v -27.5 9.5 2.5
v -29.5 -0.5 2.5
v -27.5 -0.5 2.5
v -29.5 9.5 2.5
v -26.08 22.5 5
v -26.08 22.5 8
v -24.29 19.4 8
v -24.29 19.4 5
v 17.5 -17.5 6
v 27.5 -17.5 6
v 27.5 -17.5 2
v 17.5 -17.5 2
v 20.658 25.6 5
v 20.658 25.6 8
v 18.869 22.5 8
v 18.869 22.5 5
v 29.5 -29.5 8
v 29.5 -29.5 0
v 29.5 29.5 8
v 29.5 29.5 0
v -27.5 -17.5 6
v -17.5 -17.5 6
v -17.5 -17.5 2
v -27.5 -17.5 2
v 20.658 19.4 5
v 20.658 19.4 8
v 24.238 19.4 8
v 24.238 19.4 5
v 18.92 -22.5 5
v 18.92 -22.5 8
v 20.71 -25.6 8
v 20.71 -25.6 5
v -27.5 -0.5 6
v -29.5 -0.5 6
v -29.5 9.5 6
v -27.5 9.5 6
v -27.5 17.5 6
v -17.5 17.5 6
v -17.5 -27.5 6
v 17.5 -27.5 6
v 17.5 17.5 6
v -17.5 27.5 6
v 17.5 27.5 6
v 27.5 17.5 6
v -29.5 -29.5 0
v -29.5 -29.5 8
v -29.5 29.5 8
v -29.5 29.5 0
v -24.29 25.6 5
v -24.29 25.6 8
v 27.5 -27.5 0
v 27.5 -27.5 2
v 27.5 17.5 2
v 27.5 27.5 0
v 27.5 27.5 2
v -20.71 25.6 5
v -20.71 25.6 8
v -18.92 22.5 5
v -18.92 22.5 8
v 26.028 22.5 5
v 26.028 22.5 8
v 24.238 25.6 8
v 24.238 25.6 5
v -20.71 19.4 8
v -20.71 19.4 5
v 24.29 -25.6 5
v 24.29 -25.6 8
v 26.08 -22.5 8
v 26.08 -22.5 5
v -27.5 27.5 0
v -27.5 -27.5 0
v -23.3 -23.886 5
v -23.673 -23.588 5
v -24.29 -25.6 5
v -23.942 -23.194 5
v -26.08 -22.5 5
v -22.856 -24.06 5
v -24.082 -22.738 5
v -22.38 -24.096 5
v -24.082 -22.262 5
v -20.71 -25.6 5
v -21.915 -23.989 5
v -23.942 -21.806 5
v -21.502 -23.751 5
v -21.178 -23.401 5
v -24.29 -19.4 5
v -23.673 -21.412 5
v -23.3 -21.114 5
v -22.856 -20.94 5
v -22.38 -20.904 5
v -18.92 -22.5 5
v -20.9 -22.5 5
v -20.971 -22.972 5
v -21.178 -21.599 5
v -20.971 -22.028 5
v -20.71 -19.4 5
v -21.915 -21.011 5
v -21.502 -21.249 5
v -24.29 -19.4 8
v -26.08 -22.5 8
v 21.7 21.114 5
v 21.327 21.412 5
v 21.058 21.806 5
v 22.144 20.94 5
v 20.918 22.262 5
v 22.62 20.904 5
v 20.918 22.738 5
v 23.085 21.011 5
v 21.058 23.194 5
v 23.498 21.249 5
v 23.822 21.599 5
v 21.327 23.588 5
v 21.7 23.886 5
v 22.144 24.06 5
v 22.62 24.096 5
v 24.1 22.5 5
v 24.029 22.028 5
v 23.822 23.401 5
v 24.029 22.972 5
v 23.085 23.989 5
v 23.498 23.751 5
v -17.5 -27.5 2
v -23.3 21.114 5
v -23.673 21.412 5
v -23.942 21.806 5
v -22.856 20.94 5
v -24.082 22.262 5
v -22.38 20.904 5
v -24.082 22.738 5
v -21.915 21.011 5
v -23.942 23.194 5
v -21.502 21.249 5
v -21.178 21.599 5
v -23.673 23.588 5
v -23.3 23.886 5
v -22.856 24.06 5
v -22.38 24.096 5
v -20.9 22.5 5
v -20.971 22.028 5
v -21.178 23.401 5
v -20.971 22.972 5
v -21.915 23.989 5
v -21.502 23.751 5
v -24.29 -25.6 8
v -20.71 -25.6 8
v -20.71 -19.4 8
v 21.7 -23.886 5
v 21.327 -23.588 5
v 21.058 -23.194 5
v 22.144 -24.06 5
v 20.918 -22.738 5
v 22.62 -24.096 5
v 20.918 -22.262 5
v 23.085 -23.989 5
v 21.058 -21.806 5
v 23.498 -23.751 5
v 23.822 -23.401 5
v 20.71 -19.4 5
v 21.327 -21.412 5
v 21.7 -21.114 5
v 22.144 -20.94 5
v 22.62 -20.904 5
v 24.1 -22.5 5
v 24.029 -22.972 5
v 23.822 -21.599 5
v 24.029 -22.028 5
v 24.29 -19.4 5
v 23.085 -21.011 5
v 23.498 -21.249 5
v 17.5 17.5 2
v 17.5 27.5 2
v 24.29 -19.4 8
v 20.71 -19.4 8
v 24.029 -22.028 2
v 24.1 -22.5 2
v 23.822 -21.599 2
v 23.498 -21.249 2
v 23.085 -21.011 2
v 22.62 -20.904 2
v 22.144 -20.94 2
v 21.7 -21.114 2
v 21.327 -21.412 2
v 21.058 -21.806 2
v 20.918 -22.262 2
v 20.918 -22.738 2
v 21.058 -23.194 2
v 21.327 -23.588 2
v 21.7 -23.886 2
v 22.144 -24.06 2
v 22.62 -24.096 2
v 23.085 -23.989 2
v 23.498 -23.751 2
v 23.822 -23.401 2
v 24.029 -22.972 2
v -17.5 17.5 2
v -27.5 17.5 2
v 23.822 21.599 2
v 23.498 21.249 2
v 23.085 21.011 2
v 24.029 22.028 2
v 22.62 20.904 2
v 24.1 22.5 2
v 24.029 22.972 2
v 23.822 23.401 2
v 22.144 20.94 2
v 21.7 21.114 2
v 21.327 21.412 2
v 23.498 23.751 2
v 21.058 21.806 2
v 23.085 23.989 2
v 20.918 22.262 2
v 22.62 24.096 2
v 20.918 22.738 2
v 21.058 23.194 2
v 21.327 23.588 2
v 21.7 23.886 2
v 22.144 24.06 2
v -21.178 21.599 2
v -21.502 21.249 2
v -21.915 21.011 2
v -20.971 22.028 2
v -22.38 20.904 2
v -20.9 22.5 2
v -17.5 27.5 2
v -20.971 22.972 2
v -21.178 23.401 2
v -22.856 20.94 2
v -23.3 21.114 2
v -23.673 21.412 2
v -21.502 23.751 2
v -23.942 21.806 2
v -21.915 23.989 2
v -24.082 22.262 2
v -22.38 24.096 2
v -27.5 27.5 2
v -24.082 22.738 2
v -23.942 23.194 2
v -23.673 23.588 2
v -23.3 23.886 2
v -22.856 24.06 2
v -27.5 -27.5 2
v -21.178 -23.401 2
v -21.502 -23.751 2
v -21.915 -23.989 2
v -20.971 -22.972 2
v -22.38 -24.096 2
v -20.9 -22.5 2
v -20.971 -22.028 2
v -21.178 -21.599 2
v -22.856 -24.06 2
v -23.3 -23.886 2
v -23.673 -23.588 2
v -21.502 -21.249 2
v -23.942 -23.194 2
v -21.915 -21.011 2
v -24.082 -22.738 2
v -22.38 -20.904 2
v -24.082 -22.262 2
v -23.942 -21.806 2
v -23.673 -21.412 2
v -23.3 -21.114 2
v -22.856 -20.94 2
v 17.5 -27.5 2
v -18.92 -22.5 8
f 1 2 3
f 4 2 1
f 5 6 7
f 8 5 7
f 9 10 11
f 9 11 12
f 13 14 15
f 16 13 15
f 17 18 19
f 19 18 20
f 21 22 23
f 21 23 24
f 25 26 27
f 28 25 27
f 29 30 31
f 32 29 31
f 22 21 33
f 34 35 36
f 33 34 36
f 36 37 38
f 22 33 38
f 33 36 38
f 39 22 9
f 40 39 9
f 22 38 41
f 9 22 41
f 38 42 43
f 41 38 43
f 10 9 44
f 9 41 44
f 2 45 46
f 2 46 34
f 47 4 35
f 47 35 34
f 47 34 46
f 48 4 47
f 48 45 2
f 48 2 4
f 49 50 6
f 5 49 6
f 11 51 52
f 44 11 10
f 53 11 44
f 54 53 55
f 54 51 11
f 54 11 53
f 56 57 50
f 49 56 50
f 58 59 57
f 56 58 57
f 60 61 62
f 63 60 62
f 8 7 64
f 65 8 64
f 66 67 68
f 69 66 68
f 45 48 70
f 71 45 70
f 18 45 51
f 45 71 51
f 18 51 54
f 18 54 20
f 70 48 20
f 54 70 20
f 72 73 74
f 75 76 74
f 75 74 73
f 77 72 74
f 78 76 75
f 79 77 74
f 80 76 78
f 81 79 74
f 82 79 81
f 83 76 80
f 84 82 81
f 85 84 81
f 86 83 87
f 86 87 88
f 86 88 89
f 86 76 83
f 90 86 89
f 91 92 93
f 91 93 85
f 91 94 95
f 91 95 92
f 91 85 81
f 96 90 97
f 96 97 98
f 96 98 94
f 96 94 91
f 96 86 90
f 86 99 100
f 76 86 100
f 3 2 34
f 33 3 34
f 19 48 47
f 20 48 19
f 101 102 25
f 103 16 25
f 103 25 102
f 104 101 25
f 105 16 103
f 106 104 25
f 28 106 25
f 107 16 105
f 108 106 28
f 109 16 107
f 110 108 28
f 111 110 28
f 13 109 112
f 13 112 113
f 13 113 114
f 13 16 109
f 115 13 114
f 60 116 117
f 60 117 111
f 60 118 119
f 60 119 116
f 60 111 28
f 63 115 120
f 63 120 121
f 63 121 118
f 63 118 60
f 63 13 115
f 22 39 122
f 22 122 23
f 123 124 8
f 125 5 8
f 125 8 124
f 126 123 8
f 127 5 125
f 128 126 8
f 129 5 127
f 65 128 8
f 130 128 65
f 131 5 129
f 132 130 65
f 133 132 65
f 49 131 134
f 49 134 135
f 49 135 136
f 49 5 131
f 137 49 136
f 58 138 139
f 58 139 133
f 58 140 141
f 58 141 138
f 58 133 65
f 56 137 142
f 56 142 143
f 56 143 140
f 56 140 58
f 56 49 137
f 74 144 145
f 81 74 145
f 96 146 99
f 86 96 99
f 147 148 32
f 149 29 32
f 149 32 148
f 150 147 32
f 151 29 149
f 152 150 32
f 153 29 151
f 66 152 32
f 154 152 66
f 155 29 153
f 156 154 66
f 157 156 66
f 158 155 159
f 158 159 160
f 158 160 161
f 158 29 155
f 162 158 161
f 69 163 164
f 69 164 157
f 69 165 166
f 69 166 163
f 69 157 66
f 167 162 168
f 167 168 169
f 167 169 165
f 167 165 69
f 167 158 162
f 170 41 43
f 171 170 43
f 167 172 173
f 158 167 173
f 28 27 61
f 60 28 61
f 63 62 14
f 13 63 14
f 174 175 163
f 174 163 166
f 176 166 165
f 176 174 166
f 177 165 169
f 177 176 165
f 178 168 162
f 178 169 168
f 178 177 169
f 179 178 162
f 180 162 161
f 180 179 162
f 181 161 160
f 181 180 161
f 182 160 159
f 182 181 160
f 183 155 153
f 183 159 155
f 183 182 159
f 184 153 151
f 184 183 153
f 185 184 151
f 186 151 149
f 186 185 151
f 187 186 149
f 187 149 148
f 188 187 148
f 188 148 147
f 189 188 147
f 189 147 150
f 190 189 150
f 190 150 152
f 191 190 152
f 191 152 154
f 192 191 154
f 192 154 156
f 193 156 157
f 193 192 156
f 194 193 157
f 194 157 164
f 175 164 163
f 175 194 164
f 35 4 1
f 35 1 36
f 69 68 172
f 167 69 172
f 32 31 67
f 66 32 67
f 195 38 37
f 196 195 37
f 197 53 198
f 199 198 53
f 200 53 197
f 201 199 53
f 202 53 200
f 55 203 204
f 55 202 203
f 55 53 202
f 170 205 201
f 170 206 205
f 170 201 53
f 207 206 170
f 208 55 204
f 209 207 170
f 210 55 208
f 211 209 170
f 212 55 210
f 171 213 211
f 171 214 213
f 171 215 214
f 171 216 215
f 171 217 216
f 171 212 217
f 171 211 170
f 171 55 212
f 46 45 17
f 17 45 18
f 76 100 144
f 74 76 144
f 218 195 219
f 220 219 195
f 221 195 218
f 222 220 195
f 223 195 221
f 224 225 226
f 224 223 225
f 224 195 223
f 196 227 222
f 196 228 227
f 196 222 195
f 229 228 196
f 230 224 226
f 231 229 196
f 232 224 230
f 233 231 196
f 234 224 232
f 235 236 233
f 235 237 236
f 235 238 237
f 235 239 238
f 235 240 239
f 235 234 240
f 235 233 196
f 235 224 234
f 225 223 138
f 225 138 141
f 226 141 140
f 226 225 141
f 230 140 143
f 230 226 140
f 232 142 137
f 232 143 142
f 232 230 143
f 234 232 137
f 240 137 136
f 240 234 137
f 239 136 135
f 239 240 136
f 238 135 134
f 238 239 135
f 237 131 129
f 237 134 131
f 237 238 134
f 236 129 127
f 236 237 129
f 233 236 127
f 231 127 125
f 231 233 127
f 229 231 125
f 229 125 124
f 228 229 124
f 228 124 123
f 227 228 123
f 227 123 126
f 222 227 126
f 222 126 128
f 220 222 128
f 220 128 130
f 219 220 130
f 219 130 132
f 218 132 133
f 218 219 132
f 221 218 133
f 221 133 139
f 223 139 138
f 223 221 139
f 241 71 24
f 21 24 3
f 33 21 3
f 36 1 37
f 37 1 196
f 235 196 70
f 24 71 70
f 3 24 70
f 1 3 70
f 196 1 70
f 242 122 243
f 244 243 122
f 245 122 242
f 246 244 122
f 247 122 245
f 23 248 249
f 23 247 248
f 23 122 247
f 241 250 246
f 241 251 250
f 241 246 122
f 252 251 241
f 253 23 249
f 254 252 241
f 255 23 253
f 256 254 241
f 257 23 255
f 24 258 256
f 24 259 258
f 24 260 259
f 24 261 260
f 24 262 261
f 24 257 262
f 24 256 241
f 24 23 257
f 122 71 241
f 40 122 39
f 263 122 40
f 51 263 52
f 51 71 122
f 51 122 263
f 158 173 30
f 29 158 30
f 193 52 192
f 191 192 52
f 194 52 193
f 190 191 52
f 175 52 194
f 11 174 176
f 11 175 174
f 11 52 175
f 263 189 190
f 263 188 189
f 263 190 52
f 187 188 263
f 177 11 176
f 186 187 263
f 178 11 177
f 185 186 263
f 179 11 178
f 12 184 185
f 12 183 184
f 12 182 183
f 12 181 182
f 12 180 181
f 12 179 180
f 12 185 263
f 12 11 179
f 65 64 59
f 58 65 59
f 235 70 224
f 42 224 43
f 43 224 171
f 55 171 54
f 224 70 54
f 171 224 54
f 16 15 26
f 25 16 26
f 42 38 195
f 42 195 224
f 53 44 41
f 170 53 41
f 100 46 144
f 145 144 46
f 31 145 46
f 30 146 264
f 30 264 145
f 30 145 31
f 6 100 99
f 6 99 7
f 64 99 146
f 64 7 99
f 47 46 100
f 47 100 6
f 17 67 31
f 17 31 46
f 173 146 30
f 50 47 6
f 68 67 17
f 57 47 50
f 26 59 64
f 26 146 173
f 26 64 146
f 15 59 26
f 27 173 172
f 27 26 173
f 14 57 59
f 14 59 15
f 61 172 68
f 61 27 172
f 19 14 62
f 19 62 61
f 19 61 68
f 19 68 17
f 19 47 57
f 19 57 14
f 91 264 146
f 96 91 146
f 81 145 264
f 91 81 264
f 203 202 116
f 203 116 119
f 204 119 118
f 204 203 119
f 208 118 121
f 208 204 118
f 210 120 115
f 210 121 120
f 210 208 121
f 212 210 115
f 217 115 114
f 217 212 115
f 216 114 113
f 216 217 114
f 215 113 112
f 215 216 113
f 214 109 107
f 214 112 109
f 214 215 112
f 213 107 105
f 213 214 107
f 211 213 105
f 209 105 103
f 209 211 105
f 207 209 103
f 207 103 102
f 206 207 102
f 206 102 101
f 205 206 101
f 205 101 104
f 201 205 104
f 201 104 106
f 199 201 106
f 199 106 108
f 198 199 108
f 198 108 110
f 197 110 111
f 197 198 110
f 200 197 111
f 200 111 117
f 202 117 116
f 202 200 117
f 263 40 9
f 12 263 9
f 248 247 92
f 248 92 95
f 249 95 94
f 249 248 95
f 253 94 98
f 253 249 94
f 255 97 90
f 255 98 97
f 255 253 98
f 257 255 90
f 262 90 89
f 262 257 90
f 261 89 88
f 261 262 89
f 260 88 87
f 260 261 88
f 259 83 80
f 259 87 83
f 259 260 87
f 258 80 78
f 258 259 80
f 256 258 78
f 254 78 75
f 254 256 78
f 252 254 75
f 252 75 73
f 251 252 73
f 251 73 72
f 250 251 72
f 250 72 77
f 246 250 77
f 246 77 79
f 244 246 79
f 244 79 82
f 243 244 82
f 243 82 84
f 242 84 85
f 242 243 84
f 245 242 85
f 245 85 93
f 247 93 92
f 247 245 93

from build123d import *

# Parameters (mm, degrees)
SKIZZE1_W                        = 59
SKIZZE1_H                        = 59
AUFSATZ_LINEAR_AUSTRAGEN1_DEPTH  = 8
WANDUNG4_T                       = -2
SKIZZE5_W                        = 10
SKIZZE5_H                        = 10
AUFSATZ_LINEAR_AUSTRAGEN2_DEPTH  = 4
SKIZZE3_R                        = 1.6
SCHNITT_LINEAR_AUSTRAGEN8_DEPTH  = 10
SKIZZE6_W                        = 3.5
SKIZZE6_H                        = 10
SCHNITT_LINEAR_AUSTRAGEN10_DEPTH = 2
SCHNITT_LINEAR_AUSTRAGEN11_DEPTH = 3


with BuildPart() as part:
    # Skizze1 → Aufsatz-Linear austragen1 (new body)
    with BuildSketch(Plane.XY):
        Rectangle(SKIZZE1_W, SKIZZE1_H)
    extrude(amount=AUFSATZ_LINEAR_AUSTRAGEN1_DEPTH)

    # Wandung4
    wandung4_openings = [part.faces().sort_by_distance(p)[0] for p in [
        (0, 0, 0),
    ]]
    offset(amount=WANDUNG4_T, openings=wandung4_openings, kind=Kind.INTERSECTION)

    # Skizze5 → Aufsatz-Linear austragen2 (add)
    with BuildSketch(Plane(origin=(0, 0, 6), x_dir=(-1, 0, 0), z_dir=(0, 0, -1))):
        with Locations((-22.5, 22.5)):
            Rectangle(SKIZZE5_W, SKIZZE5_H)
        with Locations((22.5, 22.5)):
            Rectangle(SKIZZE5_W, SKIZZE5_H)
        with Locations((-22.5, -22.5)):
            Rectangle(SKIZZE5_W, SKIZZE5_H)
        with Locations((22.5, -22.5)):
            Rectangle(SKIZZE5_W, SKIZZE5_H)
    extrude(amount=AUFSATZ_LINEAR_AUSTRAGEN2_DEPTH)

    # Skizze3 → Schnitt-Linear austragen8 (cut)
    with BuildSketch(Plane.XY):
        with Locations((22.5, 22.5)):
            Circle(SKIZZE3_R)
        with Locations((-22.5, 22.5)):
            Circle(SKIZZE3_R)
        with Locations((-22.5, -22.5)):
            Circle(SKIZZE3_R)
        with Locations((22.5, -22.5)):
            Circle(SKIZZE3_R)
    extrude(amount=SCHNITT_LINEAR_AUSTRAGEN8_DEPTH, mode=Mode.SUBTRACT)

    # Skizze6 → Schnitt-Linear austragen10 (cut)
    with BuildSketch(Plane.ZY.offset(29.5)):
        with Locations((4.25, 4.5)):
            Rectangle(SKIZZE6_W, SKIZZE6_H)
    extrude(amount=-SCHNITT_LINEAR_AUSTRAGEN10_DEPTH, mode=Mode.SUBTRACT)

    # Skizze7 → Schnitt-Linear austragen11 (cut)
    with BuildSketch(Plane.XY.offset(8)):
        Polygon((-20.710214166, 25.6), (-24.289785834, 25.6), (-26.079571669, 22.5), (-24.289785834, 19.4), (-20.710214166, 19.4), (-18.920428331, 22.5), align=None)
        Polygon((24.237900311, 25.6), (20.658328642, 25.6), (18.868542808, 22.5), (20.658328642, 19.4), (24.237900311, 19.4), (26.027686146, 22.5), align=None)
        Polygon((-18.920428331, -22.5), (-20.710214166, -19.4), (-24.289785834, -19.4), (-26.079571669, -22.5), (-24.289785834, -25.6), (-20.710214166, -25.6), align=None)
        Polygon((24.289785834, -19.4), (20.710214166, -19.4), (18.920428331, -22.5), (20.710214166, -25.6), (24.289785834, -25.6), (26.079571669, -22.5), align=None)
    extrude(amount=-SCHNITT_LINEAR_AUSTRAGEN11_DEPTH, mode=Mode.SUBTRACT)


solid = part.part
